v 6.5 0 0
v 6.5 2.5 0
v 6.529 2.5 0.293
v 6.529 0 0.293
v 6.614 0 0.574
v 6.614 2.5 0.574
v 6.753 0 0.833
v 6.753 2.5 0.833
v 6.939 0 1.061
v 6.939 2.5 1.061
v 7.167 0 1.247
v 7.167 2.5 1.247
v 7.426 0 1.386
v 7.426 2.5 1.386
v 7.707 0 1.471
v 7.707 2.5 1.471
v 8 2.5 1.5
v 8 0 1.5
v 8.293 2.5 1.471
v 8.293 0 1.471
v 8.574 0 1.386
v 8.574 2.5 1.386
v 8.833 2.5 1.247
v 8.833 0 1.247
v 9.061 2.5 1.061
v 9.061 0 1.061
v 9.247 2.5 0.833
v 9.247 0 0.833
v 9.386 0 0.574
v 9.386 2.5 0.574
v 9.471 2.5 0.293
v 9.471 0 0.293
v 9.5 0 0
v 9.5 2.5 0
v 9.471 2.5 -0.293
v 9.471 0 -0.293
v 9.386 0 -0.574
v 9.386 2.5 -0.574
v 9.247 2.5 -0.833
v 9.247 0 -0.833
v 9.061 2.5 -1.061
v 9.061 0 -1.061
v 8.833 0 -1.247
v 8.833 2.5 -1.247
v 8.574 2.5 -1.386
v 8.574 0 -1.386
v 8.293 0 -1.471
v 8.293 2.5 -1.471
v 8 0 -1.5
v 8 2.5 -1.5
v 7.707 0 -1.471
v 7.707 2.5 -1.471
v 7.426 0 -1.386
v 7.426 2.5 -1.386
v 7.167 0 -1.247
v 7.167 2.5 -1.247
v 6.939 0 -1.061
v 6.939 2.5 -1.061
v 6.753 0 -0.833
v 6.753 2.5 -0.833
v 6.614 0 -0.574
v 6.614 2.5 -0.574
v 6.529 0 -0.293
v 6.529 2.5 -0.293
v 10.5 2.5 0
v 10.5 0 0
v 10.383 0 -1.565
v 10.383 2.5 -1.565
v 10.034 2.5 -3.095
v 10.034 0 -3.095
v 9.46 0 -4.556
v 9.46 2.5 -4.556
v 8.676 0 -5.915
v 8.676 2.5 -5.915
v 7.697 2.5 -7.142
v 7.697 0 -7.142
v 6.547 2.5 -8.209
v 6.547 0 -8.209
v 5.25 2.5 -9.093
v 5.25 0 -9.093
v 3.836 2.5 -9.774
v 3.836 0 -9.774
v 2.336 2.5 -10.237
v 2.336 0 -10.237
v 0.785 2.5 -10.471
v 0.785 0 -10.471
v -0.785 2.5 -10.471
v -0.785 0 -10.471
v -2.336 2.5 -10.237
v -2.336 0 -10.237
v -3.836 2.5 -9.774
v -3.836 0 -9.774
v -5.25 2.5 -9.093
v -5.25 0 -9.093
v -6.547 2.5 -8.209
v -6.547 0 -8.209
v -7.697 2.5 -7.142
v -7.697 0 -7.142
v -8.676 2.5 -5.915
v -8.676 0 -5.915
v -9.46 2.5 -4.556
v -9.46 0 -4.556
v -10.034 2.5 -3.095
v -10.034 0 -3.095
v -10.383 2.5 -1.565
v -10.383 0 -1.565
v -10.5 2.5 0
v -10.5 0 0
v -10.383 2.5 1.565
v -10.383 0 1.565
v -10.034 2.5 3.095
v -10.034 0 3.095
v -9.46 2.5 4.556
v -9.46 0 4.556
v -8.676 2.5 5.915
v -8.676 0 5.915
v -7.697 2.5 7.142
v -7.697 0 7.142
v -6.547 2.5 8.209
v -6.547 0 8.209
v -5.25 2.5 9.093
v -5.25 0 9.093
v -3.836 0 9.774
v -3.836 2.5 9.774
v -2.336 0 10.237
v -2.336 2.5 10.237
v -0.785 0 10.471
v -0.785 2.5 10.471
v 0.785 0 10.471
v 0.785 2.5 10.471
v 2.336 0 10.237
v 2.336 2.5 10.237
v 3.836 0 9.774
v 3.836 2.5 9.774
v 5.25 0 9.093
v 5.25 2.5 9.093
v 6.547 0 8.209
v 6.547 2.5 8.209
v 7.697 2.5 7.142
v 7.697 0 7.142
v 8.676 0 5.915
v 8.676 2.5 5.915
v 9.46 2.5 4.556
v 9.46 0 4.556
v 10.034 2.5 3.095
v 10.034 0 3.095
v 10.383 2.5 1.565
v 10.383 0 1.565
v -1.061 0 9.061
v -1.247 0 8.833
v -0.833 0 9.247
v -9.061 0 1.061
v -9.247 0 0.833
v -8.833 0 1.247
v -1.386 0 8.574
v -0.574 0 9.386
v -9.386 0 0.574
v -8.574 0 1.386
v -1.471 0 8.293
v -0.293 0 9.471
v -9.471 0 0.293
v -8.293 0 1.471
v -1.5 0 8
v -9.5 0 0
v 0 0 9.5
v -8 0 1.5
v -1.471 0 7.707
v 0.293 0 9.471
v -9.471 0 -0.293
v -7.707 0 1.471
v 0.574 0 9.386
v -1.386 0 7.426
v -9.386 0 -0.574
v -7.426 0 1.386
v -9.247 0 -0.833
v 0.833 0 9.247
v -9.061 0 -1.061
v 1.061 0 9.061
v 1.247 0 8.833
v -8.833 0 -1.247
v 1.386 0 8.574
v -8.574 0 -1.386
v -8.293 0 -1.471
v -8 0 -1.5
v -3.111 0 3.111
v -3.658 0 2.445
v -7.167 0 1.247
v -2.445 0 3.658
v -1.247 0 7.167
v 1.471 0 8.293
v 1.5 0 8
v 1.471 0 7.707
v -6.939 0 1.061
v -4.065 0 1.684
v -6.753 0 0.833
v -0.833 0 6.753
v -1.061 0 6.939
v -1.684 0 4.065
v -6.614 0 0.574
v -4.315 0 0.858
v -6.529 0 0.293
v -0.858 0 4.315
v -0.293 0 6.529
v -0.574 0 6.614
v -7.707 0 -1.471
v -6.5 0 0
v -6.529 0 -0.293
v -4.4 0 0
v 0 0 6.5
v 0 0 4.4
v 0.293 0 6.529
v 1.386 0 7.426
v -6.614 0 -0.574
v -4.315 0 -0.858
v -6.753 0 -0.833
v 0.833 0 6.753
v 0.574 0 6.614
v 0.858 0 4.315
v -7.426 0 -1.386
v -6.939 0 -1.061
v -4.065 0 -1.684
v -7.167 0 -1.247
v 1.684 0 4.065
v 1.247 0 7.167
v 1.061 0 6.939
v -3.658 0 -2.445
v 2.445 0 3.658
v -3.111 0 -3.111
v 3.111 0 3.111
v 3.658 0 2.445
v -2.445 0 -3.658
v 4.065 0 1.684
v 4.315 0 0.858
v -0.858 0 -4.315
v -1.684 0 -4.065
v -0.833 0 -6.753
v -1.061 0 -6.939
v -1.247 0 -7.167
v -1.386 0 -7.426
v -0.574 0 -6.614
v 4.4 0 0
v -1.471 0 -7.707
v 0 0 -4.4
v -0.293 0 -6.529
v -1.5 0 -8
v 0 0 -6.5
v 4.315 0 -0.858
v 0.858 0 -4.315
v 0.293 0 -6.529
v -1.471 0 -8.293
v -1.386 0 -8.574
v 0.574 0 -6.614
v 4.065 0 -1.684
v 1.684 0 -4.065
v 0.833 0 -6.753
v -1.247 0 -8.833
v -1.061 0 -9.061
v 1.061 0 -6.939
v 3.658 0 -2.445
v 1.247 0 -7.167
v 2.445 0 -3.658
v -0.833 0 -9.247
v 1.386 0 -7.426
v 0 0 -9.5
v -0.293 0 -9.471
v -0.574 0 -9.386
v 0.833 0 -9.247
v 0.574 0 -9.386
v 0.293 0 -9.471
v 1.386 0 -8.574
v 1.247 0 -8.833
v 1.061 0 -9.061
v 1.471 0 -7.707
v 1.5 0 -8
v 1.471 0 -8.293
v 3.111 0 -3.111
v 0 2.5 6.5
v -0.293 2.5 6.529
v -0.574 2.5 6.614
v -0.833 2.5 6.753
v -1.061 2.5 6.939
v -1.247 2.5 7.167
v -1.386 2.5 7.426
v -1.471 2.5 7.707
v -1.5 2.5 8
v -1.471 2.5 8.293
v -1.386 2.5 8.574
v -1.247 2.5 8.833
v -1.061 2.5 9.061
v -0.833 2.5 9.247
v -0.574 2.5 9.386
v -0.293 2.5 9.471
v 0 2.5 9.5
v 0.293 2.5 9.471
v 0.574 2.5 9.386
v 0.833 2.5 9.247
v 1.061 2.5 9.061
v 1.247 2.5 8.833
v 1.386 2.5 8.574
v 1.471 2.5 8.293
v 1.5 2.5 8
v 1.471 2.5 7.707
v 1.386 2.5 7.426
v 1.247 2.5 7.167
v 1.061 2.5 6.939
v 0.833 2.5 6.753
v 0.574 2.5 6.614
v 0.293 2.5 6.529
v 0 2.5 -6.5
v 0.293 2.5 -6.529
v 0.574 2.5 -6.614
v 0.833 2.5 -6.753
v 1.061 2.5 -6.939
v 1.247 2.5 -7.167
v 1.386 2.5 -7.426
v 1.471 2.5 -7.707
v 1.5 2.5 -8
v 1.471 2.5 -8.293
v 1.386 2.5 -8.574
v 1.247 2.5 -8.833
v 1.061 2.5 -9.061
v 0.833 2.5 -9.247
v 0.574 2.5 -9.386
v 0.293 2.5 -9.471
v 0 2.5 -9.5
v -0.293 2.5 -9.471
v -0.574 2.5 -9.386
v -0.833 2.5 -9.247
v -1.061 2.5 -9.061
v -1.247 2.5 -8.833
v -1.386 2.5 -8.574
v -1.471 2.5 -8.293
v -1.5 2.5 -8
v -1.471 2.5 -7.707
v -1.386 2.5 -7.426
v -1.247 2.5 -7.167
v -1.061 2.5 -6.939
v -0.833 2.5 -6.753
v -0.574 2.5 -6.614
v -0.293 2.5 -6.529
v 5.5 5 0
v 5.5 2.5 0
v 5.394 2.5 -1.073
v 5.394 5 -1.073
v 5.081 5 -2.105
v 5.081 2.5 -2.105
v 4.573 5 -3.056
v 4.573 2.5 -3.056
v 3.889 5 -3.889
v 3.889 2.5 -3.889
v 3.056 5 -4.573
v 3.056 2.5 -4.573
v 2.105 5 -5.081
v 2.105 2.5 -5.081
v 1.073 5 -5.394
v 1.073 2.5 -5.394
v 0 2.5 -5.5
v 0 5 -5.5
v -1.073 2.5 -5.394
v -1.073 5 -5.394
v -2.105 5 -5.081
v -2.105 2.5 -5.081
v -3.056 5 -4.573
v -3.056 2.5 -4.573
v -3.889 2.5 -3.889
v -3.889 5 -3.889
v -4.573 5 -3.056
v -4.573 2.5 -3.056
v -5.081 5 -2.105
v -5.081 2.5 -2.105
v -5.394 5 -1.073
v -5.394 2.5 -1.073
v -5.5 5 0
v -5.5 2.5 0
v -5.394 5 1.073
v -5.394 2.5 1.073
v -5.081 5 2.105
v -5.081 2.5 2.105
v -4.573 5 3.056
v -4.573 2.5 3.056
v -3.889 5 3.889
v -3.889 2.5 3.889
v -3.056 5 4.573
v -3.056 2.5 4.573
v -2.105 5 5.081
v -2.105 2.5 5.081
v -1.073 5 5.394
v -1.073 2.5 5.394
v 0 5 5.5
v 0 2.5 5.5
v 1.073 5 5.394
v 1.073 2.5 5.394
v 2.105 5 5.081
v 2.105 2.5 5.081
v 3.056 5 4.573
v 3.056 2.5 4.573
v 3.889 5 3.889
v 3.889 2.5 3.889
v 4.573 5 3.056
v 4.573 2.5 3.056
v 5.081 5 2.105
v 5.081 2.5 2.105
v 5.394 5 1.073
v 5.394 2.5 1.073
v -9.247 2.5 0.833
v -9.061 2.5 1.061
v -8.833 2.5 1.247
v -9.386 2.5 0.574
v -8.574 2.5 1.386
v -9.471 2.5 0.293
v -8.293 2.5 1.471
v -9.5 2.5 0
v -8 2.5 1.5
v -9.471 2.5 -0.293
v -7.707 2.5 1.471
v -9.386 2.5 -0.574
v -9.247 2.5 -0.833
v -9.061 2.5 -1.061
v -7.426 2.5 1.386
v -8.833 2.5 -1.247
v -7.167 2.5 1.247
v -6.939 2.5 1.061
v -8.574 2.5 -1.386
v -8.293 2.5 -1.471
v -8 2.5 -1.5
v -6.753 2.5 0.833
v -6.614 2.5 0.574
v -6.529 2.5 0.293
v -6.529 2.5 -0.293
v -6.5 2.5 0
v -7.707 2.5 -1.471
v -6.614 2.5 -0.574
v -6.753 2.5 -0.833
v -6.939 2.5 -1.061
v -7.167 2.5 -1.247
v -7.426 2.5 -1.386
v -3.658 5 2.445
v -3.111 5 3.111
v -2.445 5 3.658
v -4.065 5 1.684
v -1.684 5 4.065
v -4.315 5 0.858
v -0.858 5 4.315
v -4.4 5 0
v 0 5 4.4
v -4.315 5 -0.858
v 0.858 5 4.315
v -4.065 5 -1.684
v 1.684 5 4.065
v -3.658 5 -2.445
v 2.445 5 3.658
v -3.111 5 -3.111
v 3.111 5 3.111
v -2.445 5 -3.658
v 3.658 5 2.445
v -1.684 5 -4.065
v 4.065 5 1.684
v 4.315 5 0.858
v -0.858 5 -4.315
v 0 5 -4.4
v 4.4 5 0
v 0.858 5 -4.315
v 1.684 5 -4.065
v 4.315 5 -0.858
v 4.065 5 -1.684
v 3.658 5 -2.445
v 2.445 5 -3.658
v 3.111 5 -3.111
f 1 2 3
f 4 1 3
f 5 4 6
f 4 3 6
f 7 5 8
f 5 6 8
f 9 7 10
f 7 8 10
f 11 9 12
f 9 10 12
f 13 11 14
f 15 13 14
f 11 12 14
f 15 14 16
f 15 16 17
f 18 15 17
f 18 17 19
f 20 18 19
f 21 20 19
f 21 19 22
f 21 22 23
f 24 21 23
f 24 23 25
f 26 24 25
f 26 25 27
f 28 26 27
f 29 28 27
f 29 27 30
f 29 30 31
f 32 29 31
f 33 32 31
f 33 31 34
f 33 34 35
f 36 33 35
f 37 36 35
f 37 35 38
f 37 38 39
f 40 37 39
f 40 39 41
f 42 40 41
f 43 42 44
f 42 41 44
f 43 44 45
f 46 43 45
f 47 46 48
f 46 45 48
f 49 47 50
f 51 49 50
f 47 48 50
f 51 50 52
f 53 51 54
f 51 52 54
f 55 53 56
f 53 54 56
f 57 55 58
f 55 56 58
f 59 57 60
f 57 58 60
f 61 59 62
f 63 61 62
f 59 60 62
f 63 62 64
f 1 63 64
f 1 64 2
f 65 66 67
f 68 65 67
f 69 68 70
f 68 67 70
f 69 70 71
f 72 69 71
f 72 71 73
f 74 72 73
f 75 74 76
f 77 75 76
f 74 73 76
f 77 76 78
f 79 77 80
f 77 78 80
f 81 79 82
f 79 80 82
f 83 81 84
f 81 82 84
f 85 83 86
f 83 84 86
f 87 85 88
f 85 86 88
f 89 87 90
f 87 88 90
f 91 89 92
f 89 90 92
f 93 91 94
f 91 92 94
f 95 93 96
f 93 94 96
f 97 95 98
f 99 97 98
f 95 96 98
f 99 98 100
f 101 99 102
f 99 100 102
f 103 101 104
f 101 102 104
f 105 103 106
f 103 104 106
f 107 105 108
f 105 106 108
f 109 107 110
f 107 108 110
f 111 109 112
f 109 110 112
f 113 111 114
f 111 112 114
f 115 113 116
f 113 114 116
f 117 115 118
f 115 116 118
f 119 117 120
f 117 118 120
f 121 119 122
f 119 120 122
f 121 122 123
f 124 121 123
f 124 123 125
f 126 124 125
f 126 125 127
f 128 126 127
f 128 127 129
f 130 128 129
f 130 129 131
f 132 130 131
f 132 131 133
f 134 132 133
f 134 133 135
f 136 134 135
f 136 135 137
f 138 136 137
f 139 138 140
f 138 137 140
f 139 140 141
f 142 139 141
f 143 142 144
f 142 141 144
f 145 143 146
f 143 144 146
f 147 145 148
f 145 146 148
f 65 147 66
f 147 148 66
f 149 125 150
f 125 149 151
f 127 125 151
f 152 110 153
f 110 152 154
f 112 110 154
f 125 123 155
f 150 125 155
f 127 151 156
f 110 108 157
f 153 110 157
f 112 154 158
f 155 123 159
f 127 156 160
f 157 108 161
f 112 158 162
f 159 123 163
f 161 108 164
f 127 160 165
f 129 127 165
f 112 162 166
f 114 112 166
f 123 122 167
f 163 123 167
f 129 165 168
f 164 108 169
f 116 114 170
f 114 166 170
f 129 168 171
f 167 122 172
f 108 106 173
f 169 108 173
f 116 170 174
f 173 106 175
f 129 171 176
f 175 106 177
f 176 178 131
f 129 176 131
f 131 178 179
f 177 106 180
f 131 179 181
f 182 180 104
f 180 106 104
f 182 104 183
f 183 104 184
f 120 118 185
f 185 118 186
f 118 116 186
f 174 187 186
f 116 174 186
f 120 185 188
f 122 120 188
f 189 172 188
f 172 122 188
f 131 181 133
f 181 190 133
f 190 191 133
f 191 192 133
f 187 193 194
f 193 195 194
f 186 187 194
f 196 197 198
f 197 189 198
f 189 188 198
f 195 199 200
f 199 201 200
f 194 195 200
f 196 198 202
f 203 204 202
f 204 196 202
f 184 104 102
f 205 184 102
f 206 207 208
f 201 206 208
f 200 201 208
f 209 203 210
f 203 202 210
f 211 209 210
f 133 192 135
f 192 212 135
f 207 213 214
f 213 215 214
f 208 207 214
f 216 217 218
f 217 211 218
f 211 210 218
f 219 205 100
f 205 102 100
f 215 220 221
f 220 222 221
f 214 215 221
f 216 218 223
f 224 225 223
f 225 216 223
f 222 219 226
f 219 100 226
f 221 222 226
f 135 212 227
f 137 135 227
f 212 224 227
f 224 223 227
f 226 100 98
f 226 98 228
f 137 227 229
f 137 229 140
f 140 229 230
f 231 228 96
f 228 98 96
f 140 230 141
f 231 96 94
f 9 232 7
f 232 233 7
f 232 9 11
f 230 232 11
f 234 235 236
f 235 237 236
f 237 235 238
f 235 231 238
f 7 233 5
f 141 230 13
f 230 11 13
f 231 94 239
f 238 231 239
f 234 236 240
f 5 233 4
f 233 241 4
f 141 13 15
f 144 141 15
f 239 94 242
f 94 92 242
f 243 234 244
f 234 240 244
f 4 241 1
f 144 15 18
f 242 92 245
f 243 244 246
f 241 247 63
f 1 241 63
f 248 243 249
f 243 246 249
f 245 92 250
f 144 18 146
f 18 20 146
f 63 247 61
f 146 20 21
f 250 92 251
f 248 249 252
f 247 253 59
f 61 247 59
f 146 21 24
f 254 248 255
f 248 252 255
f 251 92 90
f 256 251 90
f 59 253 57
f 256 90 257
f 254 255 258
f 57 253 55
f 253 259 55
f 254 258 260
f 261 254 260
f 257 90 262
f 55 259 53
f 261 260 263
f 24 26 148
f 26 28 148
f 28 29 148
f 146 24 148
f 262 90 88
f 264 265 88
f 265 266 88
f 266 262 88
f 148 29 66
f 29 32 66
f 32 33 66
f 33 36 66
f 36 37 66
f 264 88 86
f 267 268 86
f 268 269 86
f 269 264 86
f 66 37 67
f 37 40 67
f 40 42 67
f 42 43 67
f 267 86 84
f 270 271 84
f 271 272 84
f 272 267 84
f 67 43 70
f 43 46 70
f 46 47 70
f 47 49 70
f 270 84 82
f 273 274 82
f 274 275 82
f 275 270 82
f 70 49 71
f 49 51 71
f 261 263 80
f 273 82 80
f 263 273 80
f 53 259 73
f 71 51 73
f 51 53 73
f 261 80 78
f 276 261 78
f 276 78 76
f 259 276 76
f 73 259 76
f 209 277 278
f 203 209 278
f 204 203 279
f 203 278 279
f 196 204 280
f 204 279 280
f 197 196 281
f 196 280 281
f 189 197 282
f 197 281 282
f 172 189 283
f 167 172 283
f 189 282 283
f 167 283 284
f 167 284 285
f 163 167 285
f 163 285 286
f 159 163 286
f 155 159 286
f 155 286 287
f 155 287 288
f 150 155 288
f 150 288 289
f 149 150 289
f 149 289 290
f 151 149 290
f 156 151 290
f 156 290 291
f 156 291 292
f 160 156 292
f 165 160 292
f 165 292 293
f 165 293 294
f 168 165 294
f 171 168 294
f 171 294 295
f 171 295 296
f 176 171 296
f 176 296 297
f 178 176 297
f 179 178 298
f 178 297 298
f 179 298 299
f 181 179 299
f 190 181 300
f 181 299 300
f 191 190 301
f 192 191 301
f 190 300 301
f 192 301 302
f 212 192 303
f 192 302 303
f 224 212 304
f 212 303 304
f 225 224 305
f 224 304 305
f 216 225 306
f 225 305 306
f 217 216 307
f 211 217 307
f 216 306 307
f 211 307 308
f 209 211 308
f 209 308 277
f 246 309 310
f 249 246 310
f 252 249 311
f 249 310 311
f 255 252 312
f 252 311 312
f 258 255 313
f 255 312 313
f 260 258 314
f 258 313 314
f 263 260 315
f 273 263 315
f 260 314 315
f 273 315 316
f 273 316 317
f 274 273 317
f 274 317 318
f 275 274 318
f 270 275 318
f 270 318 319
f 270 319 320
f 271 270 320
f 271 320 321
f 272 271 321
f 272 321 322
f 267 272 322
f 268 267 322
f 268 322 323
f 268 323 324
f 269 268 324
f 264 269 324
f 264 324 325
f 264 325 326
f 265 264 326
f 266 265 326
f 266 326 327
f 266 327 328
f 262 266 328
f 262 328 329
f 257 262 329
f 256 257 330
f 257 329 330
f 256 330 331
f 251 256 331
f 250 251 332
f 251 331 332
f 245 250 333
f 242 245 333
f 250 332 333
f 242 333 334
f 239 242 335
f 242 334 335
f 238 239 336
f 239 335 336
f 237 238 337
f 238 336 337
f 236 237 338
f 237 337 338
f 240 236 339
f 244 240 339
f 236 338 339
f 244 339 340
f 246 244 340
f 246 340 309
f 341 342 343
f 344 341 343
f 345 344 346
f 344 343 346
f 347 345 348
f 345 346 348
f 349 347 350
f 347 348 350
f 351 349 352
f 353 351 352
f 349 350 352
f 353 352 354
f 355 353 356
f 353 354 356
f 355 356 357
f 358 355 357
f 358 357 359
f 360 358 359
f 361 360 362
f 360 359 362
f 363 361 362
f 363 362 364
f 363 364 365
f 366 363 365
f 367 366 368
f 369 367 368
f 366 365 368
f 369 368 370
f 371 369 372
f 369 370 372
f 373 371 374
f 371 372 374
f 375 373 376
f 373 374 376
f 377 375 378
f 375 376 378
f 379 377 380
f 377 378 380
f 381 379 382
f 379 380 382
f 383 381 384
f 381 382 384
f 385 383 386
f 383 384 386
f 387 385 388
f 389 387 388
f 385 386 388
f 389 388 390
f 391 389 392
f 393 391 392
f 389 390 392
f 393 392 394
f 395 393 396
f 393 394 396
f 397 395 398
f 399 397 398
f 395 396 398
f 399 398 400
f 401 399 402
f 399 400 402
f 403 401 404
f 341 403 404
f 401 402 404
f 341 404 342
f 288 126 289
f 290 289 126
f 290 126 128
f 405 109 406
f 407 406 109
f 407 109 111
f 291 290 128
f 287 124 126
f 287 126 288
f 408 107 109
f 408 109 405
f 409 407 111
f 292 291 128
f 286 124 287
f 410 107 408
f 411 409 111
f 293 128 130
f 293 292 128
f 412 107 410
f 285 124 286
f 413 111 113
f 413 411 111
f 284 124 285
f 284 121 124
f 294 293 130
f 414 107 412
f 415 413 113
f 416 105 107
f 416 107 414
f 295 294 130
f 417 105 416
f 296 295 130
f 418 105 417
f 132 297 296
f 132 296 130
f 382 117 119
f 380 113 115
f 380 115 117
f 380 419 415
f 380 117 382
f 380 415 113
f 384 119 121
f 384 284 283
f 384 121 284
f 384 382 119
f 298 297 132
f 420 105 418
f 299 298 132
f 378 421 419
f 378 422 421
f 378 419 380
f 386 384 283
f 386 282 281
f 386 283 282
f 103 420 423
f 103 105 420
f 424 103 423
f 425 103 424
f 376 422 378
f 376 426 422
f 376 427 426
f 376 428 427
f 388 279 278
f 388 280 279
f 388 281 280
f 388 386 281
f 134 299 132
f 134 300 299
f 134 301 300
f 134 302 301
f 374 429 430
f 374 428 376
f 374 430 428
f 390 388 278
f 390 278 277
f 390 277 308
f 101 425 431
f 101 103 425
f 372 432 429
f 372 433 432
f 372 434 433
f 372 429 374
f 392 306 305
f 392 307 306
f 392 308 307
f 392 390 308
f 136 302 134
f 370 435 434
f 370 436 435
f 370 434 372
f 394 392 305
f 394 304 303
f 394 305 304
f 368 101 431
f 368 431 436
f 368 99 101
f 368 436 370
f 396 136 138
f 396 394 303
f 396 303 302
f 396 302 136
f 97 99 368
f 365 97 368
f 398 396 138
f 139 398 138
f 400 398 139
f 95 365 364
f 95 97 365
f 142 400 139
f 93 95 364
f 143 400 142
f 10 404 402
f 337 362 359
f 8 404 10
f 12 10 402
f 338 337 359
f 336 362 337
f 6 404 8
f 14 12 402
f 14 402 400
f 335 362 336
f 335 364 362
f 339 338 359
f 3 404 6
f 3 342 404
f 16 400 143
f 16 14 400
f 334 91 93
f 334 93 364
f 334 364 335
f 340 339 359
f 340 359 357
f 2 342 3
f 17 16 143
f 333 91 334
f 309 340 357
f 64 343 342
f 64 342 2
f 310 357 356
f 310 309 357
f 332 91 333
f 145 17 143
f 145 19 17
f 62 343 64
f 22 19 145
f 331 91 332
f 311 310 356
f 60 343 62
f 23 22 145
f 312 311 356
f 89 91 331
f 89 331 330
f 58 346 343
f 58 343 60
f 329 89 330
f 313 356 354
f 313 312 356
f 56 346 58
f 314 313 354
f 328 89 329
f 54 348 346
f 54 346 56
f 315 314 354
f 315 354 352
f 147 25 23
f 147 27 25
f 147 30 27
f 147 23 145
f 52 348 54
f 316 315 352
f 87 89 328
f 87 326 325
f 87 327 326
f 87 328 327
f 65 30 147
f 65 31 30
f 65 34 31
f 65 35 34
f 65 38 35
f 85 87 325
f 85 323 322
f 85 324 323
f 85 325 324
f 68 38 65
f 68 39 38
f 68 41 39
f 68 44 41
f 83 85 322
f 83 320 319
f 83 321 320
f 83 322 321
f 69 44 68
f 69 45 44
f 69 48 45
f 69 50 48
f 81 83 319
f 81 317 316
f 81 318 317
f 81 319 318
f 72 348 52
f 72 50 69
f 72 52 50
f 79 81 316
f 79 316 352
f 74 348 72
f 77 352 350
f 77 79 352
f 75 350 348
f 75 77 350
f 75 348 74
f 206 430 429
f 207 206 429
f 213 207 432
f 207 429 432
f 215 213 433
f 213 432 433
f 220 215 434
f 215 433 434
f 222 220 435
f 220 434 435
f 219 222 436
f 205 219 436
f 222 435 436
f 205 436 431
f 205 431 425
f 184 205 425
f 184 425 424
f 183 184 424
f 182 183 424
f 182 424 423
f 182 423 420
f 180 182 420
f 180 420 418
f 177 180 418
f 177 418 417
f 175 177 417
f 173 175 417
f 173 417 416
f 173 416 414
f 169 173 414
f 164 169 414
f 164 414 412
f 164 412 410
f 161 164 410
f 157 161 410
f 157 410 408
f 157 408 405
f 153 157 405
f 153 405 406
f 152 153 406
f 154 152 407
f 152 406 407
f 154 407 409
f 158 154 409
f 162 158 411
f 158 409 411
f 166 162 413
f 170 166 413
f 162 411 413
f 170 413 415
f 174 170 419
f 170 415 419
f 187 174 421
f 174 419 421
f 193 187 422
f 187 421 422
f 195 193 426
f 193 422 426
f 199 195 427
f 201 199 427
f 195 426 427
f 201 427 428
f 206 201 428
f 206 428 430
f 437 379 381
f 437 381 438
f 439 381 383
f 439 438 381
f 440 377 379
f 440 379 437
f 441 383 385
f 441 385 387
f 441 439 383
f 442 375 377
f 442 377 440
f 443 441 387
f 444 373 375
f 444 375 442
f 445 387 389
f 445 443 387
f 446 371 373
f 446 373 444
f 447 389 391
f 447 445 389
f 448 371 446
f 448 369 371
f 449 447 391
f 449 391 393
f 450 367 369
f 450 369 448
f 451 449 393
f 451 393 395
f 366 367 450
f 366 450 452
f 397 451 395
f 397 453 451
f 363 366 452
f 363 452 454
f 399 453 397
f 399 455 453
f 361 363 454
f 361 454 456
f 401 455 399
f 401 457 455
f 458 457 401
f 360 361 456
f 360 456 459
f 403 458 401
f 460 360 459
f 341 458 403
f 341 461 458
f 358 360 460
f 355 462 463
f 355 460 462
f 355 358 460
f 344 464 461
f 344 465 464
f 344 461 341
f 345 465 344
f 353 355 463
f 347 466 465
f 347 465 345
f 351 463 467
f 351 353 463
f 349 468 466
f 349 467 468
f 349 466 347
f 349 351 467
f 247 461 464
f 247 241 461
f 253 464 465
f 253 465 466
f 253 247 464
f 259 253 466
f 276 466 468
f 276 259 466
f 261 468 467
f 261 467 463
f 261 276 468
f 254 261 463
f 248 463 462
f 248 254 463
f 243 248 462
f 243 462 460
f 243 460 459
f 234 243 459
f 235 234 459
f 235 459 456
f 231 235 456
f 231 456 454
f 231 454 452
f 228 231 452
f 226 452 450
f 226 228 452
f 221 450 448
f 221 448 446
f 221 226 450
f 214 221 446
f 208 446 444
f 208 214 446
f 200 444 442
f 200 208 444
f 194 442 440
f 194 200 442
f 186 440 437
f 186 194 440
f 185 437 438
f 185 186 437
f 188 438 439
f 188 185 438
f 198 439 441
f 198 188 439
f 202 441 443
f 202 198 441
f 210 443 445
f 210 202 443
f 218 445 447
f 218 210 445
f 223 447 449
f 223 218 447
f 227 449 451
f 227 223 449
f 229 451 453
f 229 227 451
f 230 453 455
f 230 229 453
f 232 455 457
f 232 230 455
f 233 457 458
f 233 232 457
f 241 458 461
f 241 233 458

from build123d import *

# Parameters (mm, degrees)
SKETCH_1_R               = 10.5
SKETCH_1_R_2             = 4.4
EXTRUDE_1_DEPTH          = 2.5
SKETCH_2_R               = 5.5
SKETCH_2_R_2             = 4.4
EXTRUDE_2_DEPTH          = 2.5
SKETCH_3_R               = 1.5
CUT_EXTRUDE_1_DEPTH      = 3.5
PATTERN_CIRCULAR_2_COUNT = 4


with BuildPart() as part:
    # Эскиз1 → Бобышка-Вытянуть1 (new body)
    with BuildSketch(Plane(origin=(0, 0, 0), x_dir=(1, 0, 0), z_dir=(0, 1, 0))):
        Circle(SKETCH_1_R)
        Circle(SKETCH_1_R_2, mode=Mode.SUBTRACT)
    extrude(amount=EXTRUDE_1_DEPTH)

    # Эскиз2 → Бобышка-Вытянуть2 (add)
    with BuildSketch(Plane(origin=(0, 2.5, 0), x_dir=(1, 0, 0), z_dir=(0, 1, 0))):
        Circle(SKETCH_2_R)
        Circle(SKETCH_2_R_2, mode=Mode.SUBTRACT)
    extrude(amount=EXTRUDE_2_DEPTH)

    # Эскиз3 → Вырез-Вытянуть1 (cut, through all)
    with BuildSketch(Plane(origin=(0, 2.5, 0), x_dir=(1, 0, 0), z_dir=(0, 1, 0))):
        with Locations((-8, 0)):
            Circle(SKETCH_3_R)
    cut_extrude_1 = extrude(amount=-CUT_EXTRUDE_1_DEPTH, mode=Mode.SUBTRACT)

    # Круговой массив2: Вырез-Вытянуть1 ×4 about axis
    pattern_circular_2_axis = Axis((0, 0, 0), (0, 1, 0))
    for i in range(1, PATTERN_CIRCULAR_2_COUNT):
        add(cut_extrude_1.rotate(pattern_circular_2_axis, i * 360 / PATTERN_CIRCULAR_2_COUNT), mode=Mode.SUBTRACT)


solid = part.part
